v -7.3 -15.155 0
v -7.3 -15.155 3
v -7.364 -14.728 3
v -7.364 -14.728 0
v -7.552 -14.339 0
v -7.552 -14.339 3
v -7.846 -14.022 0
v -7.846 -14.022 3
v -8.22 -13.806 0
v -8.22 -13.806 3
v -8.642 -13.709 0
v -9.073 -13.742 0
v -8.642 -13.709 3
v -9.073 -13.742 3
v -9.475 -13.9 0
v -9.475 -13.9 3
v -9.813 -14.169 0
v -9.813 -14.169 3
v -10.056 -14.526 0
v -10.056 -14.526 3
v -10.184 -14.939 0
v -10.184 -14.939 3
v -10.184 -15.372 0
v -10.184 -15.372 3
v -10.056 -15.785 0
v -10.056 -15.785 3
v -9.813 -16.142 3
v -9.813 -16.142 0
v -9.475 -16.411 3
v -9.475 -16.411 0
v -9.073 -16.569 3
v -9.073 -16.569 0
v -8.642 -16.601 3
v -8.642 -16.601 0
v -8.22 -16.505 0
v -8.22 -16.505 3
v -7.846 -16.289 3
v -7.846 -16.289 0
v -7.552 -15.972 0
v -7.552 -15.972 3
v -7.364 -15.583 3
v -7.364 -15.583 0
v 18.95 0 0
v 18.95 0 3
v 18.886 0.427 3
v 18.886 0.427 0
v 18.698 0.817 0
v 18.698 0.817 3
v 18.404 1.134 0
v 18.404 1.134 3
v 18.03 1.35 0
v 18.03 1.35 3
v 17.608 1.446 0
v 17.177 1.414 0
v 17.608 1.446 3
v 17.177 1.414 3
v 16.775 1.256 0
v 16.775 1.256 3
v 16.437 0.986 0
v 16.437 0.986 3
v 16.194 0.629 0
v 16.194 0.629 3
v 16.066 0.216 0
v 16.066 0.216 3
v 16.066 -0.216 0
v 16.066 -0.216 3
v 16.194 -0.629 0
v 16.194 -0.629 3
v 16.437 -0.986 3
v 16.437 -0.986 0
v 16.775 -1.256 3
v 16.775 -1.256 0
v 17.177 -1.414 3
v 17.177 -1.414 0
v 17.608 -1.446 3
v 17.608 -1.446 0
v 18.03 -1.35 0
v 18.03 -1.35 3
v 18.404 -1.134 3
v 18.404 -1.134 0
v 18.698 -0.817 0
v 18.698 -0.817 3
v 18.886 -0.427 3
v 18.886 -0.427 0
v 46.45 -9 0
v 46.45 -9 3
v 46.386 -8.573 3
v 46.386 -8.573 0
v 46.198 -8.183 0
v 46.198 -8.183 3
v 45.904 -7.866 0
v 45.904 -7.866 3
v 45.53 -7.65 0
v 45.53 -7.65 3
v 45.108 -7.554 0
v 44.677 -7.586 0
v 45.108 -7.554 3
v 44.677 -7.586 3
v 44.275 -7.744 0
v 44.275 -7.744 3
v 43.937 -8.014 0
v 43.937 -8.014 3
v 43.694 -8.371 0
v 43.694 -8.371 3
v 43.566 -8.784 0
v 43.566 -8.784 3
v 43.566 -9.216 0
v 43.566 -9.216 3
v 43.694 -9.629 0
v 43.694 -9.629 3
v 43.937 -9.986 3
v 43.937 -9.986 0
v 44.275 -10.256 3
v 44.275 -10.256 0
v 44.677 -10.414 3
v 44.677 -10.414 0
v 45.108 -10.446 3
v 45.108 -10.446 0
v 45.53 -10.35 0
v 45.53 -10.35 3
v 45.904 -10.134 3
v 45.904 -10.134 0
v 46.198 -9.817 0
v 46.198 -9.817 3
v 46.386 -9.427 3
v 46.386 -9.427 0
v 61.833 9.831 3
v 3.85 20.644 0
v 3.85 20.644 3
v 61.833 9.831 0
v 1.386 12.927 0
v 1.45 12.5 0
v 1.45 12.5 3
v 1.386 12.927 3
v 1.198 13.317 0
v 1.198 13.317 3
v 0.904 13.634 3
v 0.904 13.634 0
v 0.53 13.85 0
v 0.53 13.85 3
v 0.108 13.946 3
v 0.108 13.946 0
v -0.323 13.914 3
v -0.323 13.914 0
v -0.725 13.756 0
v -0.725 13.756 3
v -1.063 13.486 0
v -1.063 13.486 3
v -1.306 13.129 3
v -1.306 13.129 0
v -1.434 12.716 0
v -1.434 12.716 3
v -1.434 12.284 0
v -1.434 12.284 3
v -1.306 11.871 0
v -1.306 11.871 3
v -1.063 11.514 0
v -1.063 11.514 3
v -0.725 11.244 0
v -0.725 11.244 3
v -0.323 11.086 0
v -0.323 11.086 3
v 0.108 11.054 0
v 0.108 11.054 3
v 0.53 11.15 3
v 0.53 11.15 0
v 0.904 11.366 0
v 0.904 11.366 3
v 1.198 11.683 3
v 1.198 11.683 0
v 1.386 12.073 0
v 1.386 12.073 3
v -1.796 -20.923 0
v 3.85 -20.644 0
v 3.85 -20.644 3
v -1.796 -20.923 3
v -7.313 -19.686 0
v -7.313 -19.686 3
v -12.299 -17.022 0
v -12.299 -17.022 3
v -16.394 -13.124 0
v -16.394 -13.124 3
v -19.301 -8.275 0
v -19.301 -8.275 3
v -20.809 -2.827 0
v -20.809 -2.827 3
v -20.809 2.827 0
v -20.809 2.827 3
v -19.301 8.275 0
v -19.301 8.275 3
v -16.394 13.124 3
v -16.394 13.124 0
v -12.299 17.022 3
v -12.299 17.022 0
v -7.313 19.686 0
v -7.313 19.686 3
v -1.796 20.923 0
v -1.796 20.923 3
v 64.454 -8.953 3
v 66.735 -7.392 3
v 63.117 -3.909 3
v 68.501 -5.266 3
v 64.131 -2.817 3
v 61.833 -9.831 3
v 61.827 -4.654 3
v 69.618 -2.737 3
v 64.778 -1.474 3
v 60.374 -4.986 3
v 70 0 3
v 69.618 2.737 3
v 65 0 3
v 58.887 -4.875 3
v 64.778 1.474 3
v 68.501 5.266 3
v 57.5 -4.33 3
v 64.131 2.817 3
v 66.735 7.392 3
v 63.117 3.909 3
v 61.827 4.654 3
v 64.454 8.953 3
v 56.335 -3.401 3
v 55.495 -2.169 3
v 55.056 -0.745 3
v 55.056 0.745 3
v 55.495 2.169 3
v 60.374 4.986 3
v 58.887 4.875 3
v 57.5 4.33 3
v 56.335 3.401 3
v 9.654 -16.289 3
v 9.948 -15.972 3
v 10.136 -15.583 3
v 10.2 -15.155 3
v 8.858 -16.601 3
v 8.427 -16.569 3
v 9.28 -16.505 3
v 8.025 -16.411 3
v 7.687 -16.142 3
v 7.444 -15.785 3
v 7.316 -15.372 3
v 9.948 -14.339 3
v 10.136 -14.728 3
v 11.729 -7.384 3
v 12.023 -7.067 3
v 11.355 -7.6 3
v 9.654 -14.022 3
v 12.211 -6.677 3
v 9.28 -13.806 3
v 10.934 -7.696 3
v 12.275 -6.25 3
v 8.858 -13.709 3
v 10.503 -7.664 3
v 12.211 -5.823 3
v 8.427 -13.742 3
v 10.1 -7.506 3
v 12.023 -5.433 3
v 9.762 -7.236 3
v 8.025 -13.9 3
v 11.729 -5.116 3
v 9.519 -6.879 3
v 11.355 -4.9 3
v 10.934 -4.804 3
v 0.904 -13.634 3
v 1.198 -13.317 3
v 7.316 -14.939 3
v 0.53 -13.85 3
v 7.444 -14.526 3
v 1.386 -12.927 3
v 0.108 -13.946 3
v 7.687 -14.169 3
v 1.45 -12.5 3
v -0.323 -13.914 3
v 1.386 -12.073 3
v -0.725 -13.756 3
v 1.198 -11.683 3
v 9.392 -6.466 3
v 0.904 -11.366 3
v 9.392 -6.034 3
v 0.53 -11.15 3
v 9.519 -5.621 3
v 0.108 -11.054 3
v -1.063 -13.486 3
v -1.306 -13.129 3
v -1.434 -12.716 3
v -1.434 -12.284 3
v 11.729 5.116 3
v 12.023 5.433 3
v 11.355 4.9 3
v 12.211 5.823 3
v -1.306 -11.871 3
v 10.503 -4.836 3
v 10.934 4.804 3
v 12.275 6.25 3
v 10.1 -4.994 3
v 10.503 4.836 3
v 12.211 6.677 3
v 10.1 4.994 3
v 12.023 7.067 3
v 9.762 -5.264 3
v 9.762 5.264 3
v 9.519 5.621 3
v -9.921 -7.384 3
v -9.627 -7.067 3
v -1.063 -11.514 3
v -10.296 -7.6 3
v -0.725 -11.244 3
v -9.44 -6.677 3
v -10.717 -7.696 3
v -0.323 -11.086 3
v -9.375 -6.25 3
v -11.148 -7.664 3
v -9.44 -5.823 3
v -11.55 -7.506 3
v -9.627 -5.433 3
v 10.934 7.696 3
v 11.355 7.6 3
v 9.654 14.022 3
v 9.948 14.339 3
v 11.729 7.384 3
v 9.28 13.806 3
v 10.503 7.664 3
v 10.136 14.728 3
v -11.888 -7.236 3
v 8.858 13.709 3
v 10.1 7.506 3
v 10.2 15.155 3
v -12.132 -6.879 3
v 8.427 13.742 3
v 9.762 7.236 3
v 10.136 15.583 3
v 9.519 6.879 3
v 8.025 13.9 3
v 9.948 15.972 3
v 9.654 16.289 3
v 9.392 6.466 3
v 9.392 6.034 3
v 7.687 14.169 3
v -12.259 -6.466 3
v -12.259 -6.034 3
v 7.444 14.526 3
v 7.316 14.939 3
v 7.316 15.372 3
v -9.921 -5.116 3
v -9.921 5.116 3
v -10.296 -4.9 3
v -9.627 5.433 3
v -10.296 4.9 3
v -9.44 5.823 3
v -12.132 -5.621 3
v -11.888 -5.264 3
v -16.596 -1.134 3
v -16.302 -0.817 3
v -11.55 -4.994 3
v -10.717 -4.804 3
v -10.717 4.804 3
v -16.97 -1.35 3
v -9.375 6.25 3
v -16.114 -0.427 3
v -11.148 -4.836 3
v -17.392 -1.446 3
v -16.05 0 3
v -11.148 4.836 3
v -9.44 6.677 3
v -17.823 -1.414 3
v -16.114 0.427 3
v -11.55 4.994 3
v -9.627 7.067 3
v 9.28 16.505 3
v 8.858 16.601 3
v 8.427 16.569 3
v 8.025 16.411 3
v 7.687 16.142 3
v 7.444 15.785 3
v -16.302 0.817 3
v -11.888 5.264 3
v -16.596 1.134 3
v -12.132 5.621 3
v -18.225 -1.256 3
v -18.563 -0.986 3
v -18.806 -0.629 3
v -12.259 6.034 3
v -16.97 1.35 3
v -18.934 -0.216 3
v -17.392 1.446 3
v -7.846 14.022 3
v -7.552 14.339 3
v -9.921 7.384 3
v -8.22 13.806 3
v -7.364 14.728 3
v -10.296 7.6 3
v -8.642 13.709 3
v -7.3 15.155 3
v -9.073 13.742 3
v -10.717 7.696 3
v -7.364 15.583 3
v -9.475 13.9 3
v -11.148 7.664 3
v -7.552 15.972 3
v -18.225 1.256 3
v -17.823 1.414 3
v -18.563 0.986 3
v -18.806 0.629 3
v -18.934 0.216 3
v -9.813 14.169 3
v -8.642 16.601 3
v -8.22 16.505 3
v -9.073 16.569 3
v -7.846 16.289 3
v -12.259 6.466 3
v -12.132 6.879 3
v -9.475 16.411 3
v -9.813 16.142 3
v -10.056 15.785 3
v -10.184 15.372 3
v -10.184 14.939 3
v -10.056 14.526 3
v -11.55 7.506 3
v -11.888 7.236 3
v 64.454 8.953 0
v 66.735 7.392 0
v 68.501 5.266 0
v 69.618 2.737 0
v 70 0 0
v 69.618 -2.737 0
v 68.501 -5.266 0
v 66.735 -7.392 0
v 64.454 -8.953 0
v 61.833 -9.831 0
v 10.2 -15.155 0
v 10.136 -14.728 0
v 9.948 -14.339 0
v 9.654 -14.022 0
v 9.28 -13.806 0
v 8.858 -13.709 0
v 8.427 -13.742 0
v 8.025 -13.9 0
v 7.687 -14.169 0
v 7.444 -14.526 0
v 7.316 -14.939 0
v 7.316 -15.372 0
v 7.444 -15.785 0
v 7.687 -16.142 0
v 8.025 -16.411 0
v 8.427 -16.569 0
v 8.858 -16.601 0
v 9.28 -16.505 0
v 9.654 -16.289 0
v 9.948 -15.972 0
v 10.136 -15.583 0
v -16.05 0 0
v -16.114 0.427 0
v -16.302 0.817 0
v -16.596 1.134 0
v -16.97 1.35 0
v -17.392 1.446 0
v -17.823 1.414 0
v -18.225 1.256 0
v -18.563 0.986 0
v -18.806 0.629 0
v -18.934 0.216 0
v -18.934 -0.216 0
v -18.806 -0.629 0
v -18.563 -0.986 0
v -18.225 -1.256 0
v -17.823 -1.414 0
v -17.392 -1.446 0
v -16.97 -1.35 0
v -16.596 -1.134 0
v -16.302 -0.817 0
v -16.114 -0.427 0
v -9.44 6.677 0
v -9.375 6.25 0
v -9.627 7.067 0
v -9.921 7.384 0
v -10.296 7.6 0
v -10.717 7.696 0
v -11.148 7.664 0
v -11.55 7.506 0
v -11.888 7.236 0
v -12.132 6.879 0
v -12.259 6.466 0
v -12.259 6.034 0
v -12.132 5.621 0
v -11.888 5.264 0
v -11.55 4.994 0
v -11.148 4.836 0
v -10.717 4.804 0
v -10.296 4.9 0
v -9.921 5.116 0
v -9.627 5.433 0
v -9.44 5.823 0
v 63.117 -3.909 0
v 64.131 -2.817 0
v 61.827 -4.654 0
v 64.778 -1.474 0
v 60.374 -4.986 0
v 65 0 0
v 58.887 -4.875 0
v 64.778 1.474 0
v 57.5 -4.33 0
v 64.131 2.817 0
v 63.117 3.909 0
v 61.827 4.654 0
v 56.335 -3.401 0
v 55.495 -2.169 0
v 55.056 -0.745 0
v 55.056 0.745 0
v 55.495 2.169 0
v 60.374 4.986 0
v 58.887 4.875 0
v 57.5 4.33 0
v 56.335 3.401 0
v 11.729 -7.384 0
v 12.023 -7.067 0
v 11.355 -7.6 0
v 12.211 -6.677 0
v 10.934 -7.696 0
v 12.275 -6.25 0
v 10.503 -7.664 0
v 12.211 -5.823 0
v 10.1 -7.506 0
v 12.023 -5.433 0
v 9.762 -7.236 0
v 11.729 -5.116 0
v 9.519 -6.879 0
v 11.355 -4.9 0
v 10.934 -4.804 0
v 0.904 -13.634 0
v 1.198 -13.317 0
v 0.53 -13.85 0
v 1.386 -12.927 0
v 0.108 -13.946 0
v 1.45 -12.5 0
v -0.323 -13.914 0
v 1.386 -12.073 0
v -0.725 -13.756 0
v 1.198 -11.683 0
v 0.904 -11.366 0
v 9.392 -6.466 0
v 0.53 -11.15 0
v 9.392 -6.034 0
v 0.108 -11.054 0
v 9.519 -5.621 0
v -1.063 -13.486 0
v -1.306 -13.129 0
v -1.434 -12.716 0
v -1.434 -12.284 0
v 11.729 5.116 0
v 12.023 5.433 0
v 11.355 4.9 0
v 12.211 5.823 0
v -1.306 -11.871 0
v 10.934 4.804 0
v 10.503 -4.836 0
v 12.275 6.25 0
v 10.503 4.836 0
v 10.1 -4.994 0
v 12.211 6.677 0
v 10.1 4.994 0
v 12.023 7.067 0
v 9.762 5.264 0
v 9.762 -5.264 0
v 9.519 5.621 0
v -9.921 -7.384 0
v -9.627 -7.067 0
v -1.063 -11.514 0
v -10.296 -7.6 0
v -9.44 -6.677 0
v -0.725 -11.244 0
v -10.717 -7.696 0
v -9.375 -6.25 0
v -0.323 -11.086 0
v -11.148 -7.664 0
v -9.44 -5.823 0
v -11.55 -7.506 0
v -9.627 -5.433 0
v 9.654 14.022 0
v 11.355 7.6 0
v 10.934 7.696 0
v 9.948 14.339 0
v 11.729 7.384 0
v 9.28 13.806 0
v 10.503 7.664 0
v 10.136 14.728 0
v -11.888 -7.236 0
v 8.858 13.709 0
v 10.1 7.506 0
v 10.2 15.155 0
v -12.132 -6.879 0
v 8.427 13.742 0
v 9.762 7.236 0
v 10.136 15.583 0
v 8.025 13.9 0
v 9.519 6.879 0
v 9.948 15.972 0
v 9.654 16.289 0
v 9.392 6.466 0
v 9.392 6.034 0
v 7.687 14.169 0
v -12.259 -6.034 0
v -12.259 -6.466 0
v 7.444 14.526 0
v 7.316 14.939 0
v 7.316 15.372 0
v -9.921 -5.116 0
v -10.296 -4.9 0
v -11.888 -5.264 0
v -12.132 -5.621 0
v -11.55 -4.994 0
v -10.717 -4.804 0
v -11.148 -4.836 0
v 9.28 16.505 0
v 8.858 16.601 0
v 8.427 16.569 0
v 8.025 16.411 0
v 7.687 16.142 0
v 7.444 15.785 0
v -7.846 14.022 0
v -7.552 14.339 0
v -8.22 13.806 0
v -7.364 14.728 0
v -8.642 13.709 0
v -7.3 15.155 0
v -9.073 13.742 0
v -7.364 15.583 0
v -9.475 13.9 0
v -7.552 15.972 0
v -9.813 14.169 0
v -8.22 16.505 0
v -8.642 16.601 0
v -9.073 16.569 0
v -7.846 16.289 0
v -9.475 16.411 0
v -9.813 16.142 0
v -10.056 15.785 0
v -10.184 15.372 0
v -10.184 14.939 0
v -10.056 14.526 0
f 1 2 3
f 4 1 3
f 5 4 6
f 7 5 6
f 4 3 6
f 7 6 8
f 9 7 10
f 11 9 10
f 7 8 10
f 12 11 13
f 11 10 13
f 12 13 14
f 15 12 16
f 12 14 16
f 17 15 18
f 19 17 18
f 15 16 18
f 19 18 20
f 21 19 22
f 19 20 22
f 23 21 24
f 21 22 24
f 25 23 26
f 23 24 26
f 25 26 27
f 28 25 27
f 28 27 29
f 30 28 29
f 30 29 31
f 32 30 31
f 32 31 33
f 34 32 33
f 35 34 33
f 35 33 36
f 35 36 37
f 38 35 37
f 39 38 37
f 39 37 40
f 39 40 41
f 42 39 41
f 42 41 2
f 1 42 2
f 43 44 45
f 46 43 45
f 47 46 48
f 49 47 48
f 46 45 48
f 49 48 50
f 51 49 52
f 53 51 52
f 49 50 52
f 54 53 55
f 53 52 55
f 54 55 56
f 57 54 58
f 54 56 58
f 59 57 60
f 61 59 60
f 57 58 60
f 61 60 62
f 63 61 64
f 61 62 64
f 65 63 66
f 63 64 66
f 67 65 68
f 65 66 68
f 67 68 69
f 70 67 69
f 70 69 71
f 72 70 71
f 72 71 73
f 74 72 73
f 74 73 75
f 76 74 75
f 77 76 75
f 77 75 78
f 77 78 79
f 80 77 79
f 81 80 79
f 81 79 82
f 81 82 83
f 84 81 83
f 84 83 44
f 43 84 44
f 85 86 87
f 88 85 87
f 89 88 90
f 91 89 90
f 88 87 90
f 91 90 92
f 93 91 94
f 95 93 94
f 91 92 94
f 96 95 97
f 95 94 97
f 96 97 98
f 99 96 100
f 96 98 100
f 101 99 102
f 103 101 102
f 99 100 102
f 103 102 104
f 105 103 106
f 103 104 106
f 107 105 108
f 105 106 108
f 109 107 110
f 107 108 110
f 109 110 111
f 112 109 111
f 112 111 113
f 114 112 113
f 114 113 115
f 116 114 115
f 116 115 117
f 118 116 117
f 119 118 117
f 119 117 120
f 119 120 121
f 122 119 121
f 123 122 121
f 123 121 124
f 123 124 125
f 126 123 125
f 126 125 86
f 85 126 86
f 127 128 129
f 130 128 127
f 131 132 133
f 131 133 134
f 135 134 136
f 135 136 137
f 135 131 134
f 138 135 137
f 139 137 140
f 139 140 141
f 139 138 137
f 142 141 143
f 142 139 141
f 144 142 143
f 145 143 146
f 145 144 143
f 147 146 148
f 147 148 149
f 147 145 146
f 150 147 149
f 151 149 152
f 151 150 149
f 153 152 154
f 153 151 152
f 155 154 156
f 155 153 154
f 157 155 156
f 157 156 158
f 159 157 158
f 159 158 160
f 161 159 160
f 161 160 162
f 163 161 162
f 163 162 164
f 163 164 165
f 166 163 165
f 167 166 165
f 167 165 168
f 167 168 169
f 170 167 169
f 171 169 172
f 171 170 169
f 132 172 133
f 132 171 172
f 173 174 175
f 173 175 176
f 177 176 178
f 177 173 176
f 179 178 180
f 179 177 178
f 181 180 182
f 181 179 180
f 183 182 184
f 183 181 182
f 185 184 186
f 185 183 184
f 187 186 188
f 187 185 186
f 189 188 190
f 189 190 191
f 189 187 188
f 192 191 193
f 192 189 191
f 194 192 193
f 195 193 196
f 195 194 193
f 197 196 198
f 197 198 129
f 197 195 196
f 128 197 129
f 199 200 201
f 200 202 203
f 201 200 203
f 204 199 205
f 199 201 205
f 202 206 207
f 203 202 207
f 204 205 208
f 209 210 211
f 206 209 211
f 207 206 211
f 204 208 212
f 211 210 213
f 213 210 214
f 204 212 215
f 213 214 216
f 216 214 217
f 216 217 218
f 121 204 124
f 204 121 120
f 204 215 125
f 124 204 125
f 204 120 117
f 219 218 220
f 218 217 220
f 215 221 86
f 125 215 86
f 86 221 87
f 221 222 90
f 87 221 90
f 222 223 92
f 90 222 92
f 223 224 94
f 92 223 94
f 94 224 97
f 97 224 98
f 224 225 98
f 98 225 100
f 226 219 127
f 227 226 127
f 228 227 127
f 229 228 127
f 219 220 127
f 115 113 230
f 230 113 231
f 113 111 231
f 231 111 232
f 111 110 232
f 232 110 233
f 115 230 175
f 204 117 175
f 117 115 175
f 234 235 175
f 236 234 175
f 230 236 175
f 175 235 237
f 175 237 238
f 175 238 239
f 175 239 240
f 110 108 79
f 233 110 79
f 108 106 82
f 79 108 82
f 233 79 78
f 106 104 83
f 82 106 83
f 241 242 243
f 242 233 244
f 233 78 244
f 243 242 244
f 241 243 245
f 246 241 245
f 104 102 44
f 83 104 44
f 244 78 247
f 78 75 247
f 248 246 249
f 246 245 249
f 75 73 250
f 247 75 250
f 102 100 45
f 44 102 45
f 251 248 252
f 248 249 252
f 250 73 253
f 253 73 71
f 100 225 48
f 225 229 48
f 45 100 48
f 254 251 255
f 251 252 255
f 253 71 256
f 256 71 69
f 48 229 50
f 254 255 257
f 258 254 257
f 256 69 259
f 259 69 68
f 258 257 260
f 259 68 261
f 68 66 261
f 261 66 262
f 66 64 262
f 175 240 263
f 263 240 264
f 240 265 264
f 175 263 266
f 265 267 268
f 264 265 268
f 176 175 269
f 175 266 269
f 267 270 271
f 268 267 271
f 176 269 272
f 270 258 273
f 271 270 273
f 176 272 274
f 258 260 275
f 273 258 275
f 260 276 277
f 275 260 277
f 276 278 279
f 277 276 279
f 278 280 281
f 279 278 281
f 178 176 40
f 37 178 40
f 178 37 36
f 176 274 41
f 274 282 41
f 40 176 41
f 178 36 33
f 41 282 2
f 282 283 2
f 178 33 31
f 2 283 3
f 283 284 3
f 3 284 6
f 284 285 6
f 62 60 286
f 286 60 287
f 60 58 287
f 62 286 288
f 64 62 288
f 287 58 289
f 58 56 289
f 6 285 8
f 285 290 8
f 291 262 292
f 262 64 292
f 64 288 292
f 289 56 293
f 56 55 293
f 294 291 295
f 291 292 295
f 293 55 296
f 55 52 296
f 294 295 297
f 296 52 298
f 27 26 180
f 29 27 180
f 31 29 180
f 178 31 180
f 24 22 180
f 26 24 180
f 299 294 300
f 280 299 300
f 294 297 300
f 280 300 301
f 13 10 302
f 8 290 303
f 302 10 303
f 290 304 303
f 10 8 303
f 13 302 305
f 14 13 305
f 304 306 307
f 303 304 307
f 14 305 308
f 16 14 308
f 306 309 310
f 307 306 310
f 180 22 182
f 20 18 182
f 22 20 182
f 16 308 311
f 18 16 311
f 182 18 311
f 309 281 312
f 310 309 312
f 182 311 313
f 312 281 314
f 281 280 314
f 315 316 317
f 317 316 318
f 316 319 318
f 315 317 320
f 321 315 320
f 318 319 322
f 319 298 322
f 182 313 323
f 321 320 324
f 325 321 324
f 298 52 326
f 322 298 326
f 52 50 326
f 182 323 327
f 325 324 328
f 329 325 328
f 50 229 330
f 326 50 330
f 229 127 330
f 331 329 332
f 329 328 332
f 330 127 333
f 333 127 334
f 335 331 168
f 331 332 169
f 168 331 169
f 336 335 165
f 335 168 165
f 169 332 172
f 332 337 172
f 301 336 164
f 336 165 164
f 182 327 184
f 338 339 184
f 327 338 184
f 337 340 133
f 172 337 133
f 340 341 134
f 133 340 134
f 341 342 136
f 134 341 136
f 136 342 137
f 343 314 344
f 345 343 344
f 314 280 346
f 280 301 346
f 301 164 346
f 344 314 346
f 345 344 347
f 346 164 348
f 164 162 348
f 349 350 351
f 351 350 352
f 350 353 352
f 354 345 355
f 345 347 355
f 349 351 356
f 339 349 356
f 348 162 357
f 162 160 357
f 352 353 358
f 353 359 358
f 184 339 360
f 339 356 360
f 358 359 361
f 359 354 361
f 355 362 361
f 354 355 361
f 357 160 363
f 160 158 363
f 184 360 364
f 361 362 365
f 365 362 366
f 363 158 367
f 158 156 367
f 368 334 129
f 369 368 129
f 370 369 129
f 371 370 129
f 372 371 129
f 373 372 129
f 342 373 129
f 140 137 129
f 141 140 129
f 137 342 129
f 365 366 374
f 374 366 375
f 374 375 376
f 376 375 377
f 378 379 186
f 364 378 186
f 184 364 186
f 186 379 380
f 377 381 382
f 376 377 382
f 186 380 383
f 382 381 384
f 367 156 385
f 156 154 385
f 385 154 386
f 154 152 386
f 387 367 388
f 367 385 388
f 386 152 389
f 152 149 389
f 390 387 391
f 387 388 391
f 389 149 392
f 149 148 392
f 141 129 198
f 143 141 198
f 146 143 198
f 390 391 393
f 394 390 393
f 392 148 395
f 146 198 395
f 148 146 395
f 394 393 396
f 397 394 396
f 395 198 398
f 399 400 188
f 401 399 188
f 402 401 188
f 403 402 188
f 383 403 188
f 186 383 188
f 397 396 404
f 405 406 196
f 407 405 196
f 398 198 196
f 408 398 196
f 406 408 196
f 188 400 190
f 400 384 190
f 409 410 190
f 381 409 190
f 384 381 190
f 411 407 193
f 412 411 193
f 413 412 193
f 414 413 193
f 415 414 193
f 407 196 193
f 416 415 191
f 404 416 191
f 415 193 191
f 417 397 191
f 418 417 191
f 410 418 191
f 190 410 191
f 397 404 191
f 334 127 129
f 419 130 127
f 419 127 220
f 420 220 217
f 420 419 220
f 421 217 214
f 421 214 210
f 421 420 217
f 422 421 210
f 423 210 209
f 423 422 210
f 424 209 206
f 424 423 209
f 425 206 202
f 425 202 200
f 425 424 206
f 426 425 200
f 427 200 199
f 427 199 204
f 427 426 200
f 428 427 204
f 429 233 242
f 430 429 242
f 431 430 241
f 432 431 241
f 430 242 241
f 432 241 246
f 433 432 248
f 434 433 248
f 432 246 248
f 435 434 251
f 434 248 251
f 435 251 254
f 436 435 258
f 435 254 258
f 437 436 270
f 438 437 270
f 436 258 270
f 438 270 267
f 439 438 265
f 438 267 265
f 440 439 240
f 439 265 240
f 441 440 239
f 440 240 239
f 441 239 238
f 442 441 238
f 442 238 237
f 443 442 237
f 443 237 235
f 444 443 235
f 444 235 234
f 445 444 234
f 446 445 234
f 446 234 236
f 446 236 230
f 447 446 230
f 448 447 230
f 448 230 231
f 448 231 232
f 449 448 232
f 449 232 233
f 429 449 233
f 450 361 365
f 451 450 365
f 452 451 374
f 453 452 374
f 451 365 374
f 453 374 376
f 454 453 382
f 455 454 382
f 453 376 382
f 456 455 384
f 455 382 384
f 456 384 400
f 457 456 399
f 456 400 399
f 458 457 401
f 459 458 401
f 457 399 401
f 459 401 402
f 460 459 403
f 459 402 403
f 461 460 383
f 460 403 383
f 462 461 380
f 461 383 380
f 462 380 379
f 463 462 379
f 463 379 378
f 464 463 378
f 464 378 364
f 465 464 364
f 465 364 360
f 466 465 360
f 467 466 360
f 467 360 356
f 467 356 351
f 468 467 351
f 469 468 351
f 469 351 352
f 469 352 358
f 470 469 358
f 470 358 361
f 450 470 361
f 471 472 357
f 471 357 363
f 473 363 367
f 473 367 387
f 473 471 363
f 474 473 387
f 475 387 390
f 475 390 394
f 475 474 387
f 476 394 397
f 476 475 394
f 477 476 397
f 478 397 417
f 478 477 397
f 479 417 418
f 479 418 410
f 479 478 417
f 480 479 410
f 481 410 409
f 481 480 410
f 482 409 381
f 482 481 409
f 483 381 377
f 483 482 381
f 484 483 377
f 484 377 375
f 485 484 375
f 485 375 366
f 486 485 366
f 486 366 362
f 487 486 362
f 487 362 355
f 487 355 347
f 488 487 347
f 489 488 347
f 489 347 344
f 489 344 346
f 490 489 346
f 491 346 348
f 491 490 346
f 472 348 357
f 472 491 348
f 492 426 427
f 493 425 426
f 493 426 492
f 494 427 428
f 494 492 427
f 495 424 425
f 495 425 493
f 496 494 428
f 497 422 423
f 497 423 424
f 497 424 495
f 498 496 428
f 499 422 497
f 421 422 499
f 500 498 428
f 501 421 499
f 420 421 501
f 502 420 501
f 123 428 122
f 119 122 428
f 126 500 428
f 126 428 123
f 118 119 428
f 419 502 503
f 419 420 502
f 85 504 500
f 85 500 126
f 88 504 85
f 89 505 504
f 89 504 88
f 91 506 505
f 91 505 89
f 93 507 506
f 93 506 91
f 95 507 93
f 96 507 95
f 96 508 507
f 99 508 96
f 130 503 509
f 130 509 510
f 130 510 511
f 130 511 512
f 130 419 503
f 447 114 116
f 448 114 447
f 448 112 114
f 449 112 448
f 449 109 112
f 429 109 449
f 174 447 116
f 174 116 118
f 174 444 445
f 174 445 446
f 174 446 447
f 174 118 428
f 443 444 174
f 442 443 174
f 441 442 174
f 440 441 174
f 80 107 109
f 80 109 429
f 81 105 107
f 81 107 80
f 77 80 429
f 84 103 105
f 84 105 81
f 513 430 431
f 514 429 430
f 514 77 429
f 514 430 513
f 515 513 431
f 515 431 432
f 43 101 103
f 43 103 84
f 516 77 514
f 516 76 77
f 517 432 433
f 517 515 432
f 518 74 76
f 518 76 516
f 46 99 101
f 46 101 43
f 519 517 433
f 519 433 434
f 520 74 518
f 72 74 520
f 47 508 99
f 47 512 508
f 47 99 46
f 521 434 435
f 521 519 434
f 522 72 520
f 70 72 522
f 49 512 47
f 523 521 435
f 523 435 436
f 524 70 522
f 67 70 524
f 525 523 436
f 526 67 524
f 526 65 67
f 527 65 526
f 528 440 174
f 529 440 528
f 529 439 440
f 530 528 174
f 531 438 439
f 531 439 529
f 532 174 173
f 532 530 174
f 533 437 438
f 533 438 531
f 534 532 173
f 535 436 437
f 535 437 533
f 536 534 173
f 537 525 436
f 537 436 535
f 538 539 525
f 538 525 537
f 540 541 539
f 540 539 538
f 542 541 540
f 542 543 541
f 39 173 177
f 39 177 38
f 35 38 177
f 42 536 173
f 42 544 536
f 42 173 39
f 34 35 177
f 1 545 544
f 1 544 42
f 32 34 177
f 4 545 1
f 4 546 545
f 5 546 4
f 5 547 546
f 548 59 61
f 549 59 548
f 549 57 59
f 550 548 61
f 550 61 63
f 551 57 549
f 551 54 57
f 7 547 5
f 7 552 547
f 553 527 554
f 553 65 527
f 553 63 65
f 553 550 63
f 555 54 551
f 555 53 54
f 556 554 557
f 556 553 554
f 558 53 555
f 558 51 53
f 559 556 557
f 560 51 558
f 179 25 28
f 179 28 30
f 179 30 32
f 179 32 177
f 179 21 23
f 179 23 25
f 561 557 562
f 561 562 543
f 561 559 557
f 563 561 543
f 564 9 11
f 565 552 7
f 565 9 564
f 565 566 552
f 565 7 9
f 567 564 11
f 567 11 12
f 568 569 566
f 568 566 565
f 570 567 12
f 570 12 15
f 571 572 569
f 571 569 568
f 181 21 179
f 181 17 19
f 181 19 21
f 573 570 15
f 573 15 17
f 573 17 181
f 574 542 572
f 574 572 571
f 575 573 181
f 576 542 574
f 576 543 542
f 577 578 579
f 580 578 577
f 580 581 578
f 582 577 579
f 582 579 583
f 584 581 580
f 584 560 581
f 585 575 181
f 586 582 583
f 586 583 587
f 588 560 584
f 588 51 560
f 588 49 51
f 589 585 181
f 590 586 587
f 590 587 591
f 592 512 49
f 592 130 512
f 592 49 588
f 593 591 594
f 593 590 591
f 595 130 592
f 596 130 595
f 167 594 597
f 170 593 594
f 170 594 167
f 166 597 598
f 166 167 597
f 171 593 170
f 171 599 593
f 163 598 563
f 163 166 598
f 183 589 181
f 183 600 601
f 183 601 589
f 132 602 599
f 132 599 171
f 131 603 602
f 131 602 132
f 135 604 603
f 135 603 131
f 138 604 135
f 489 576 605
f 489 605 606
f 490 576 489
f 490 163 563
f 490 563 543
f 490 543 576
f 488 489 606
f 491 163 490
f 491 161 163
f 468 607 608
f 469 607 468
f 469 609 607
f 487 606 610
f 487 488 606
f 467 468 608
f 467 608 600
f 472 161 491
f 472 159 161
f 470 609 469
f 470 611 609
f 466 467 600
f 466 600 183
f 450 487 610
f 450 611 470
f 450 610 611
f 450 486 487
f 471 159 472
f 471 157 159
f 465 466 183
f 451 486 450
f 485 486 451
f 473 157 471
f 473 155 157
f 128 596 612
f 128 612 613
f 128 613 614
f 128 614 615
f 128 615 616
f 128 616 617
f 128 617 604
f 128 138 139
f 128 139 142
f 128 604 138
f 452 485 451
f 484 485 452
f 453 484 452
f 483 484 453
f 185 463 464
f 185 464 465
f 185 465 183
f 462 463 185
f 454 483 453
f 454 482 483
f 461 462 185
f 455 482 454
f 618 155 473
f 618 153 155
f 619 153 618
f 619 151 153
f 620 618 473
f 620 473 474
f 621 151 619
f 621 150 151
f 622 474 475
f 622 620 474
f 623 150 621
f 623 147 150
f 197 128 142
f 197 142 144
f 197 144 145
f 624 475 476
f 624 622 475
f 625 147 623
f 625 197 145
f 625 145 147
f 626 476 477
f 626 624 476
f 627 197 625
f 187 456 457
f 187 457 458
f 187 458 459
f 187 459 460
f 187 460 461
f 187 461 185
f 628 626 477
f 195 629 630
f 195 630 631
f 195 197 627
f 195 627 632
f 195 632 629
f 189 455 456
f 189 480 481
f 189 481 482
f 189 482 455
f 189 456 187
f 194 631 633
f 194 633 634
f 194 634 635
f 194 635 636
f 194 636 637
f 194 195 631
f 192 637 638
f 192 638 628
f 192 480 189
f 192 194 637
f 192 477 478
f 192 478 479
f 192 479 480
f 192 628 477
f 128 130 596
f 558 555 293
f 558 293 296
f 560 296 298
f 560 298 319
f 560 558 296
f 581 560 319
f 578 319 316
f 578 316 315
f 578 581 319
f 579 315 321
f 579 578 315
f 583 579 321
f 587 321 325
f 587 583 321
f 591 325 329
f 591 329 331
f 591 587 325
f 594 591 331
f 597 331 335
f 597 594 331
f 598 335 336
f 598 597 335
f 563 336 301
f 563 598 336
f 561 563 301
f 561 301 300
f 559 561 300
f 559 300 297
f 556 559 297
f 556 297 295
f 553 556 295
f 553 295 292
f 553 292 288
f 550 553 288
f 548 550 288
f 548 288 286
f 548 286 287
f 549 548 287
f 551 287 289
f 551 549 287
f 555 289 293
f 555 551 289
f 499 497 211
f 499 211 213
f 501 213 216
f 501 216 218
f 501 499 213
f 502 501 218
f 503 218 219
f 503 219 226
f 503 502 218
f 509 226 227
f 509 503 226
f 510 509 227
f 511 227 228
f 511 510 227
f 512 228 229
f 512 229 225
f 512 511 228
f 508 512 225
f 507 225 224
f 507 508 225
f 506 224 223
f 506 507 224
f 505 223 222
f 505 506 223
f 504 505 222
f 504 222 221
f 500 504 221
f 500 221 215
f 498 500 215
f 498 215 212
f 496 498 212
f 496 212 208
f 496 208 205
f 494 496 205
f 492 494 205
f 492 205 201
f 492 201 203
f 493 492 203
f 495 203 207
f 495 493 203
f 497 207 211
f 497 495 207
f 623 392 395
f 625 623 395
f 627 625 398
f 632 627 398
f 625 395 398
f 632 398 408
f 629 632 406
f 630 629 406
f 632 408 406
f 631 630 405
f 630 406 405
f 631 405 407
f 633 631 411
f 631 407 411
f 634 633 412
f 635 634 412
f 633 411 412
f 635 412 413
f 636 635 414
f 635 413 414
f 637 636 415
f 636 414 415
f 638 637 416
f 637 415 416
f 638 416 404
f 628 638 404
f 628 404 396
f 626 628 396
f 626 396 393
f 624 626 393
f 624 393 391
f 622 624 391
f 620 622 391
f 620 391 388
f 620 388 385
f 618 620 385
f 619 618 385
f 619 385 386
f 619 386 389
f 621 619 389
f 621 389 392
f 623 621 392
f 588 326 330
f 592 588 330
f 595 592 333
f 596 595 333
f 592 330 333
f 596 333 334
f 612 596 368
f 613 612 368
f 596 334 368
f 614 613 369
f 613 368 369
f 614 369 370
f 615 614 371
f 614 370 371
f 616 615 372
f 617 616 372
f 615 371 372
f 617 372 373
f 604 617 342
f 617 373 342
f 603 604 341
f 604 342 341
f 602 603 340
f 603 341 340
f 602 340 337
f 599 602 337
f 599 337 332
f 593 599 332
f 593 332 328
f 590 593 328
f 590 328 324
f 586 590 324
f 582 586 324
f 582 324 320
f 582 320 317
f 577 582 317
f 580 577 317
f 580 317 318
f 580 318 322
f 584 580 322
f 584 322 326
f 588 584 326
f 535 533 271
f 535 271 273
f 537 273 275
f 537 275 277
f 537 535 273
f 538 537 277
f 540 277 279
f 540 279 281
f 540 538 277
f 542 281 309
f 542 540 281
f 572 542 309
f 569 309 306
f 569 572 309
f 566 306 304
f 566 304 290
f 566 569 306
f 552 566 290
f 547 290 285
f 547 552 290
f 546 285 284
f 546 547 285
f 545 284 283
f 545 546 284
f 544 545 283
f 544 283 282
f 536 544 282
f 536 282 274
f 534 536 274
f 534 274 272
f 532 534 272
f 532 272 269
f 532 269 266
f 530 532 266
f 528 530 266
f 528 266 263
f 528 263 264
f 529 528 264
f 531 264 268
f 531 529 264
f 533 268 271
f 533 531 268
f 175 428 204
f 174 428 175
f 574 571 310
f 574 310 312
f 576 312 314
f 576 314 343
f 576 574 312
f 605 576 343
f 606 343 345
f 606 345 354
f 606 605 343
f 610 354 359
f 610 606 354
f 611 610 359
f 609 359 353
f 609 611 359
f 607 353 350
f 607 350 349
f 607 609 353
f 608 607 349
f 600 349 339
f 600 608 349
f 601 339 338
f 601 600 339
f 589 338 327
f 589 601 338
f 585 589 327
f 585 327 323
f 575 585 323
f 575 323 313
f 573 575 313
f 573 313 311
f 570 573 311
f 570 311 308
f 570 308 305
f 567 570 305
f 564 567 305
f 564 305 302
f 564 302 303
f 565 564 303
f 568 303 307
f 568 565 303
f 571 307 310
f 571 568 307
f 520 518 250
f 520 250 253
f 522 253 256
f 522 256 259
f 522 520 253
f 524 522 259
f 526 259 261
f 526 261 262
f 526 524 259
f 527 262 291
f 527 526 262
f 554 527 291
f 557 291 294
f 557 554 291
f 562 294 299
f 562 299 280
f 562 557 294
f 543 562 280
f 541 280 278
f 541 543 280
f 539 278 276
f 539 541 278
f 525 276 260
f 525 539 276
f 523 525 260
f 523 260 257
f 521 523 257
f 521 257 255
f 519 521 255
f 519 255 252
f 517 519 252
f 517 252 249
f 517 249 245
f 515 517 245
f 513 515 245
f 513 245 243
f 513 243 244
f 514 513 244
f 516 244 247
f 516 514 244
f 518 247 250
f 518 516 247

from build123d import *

# Parameters (mm, degrees)
SKETCH_1_R          = 5
SKETCH_1_R_2        = 1.45
EXTRUDE_1_DEPTH     = 3
SKETCH_2_R          = 1.45
CUT_EXTRUDE_1_DEPTH = 74.143694192


with BuildPart() as part:
    # 草图1 → 凸台-拉伸1 (new body)
    with BuildSketch(Plane.XY):
        with BuildLine():
            Line((61.833333333, -9.830508069), (3.85, -20.644066944))
            ThreePointArc((3.85, -20.644066944), (-21, 0), (3.85, 20.644066944))
            Line((3.85, 20.644066944), (61.833333333, 9.830508069))
            ThreePointArc((61.833333333, 9.830508069), (70, 0), (61.833333333, -9.830508069))
        make_face()
        with Locations((60, 0)):
            Circle(SKETCH_1_R, mode=Mode.SUBTRACT)
        with Locations((0, 12.5)):
            Circle(SKETCH_1_R_2, mode=Mode.SUBTRACT)
        with Locations((10.825317547, 6.25)):
            Circle(SKETCH_1_R_2, mode=Mode.SUBTRACT)
        with Locations((10.825317547, -6.25)):
            Circle(SKETCH_1_R_2, mode=Mode.SUBTRACT)
        with Locations((0, -12.5)):
            Circle(SKETCH_1_R_2, mode=Mode.SUBTRACT)
        with Locations((-10.825317547, -6.25)):
            Circle(SKETCH_1_R_2, mode=Mode.SUBTRACT)
        with Locations((-10.825317547, 6.25)):
            Circle(SKETCH_1_R_2, mode=Mode.SUBTRACT)
    extrude(amount=EXTRUDE_1_DEPTH)

    # 草图2 → 切除-拉伸1 (cut, through all)
    with BuildSketch(Plane.XY.offset(3)):
        with Locations((8.75, 15.155444566)):
            Circle(SKETCH_2_R)
        with Locations((17.5, 0)):
            Circle(SKETCH_2_R)
        with Locations((8.75, -15.155444566)):
            Circle(SKETCH_2_R)
        with Locations((-8.75, -15.155444566)):
            Circle(SKETCH_2_R)
        with Locations((-17.5, 0)):
            Circle(SKETCH_2_R)
        with Locations((-8.75, 15.155444566)):
            Circle(SKETCH_2_R)
        with Locations((45, -9)):
            Circle(SKETCH_2_R)
    extrude(amount=-CUT_EXTRUDE_1_DEPTH, mode=Mode.SUBTRACT)


solid = part.part
